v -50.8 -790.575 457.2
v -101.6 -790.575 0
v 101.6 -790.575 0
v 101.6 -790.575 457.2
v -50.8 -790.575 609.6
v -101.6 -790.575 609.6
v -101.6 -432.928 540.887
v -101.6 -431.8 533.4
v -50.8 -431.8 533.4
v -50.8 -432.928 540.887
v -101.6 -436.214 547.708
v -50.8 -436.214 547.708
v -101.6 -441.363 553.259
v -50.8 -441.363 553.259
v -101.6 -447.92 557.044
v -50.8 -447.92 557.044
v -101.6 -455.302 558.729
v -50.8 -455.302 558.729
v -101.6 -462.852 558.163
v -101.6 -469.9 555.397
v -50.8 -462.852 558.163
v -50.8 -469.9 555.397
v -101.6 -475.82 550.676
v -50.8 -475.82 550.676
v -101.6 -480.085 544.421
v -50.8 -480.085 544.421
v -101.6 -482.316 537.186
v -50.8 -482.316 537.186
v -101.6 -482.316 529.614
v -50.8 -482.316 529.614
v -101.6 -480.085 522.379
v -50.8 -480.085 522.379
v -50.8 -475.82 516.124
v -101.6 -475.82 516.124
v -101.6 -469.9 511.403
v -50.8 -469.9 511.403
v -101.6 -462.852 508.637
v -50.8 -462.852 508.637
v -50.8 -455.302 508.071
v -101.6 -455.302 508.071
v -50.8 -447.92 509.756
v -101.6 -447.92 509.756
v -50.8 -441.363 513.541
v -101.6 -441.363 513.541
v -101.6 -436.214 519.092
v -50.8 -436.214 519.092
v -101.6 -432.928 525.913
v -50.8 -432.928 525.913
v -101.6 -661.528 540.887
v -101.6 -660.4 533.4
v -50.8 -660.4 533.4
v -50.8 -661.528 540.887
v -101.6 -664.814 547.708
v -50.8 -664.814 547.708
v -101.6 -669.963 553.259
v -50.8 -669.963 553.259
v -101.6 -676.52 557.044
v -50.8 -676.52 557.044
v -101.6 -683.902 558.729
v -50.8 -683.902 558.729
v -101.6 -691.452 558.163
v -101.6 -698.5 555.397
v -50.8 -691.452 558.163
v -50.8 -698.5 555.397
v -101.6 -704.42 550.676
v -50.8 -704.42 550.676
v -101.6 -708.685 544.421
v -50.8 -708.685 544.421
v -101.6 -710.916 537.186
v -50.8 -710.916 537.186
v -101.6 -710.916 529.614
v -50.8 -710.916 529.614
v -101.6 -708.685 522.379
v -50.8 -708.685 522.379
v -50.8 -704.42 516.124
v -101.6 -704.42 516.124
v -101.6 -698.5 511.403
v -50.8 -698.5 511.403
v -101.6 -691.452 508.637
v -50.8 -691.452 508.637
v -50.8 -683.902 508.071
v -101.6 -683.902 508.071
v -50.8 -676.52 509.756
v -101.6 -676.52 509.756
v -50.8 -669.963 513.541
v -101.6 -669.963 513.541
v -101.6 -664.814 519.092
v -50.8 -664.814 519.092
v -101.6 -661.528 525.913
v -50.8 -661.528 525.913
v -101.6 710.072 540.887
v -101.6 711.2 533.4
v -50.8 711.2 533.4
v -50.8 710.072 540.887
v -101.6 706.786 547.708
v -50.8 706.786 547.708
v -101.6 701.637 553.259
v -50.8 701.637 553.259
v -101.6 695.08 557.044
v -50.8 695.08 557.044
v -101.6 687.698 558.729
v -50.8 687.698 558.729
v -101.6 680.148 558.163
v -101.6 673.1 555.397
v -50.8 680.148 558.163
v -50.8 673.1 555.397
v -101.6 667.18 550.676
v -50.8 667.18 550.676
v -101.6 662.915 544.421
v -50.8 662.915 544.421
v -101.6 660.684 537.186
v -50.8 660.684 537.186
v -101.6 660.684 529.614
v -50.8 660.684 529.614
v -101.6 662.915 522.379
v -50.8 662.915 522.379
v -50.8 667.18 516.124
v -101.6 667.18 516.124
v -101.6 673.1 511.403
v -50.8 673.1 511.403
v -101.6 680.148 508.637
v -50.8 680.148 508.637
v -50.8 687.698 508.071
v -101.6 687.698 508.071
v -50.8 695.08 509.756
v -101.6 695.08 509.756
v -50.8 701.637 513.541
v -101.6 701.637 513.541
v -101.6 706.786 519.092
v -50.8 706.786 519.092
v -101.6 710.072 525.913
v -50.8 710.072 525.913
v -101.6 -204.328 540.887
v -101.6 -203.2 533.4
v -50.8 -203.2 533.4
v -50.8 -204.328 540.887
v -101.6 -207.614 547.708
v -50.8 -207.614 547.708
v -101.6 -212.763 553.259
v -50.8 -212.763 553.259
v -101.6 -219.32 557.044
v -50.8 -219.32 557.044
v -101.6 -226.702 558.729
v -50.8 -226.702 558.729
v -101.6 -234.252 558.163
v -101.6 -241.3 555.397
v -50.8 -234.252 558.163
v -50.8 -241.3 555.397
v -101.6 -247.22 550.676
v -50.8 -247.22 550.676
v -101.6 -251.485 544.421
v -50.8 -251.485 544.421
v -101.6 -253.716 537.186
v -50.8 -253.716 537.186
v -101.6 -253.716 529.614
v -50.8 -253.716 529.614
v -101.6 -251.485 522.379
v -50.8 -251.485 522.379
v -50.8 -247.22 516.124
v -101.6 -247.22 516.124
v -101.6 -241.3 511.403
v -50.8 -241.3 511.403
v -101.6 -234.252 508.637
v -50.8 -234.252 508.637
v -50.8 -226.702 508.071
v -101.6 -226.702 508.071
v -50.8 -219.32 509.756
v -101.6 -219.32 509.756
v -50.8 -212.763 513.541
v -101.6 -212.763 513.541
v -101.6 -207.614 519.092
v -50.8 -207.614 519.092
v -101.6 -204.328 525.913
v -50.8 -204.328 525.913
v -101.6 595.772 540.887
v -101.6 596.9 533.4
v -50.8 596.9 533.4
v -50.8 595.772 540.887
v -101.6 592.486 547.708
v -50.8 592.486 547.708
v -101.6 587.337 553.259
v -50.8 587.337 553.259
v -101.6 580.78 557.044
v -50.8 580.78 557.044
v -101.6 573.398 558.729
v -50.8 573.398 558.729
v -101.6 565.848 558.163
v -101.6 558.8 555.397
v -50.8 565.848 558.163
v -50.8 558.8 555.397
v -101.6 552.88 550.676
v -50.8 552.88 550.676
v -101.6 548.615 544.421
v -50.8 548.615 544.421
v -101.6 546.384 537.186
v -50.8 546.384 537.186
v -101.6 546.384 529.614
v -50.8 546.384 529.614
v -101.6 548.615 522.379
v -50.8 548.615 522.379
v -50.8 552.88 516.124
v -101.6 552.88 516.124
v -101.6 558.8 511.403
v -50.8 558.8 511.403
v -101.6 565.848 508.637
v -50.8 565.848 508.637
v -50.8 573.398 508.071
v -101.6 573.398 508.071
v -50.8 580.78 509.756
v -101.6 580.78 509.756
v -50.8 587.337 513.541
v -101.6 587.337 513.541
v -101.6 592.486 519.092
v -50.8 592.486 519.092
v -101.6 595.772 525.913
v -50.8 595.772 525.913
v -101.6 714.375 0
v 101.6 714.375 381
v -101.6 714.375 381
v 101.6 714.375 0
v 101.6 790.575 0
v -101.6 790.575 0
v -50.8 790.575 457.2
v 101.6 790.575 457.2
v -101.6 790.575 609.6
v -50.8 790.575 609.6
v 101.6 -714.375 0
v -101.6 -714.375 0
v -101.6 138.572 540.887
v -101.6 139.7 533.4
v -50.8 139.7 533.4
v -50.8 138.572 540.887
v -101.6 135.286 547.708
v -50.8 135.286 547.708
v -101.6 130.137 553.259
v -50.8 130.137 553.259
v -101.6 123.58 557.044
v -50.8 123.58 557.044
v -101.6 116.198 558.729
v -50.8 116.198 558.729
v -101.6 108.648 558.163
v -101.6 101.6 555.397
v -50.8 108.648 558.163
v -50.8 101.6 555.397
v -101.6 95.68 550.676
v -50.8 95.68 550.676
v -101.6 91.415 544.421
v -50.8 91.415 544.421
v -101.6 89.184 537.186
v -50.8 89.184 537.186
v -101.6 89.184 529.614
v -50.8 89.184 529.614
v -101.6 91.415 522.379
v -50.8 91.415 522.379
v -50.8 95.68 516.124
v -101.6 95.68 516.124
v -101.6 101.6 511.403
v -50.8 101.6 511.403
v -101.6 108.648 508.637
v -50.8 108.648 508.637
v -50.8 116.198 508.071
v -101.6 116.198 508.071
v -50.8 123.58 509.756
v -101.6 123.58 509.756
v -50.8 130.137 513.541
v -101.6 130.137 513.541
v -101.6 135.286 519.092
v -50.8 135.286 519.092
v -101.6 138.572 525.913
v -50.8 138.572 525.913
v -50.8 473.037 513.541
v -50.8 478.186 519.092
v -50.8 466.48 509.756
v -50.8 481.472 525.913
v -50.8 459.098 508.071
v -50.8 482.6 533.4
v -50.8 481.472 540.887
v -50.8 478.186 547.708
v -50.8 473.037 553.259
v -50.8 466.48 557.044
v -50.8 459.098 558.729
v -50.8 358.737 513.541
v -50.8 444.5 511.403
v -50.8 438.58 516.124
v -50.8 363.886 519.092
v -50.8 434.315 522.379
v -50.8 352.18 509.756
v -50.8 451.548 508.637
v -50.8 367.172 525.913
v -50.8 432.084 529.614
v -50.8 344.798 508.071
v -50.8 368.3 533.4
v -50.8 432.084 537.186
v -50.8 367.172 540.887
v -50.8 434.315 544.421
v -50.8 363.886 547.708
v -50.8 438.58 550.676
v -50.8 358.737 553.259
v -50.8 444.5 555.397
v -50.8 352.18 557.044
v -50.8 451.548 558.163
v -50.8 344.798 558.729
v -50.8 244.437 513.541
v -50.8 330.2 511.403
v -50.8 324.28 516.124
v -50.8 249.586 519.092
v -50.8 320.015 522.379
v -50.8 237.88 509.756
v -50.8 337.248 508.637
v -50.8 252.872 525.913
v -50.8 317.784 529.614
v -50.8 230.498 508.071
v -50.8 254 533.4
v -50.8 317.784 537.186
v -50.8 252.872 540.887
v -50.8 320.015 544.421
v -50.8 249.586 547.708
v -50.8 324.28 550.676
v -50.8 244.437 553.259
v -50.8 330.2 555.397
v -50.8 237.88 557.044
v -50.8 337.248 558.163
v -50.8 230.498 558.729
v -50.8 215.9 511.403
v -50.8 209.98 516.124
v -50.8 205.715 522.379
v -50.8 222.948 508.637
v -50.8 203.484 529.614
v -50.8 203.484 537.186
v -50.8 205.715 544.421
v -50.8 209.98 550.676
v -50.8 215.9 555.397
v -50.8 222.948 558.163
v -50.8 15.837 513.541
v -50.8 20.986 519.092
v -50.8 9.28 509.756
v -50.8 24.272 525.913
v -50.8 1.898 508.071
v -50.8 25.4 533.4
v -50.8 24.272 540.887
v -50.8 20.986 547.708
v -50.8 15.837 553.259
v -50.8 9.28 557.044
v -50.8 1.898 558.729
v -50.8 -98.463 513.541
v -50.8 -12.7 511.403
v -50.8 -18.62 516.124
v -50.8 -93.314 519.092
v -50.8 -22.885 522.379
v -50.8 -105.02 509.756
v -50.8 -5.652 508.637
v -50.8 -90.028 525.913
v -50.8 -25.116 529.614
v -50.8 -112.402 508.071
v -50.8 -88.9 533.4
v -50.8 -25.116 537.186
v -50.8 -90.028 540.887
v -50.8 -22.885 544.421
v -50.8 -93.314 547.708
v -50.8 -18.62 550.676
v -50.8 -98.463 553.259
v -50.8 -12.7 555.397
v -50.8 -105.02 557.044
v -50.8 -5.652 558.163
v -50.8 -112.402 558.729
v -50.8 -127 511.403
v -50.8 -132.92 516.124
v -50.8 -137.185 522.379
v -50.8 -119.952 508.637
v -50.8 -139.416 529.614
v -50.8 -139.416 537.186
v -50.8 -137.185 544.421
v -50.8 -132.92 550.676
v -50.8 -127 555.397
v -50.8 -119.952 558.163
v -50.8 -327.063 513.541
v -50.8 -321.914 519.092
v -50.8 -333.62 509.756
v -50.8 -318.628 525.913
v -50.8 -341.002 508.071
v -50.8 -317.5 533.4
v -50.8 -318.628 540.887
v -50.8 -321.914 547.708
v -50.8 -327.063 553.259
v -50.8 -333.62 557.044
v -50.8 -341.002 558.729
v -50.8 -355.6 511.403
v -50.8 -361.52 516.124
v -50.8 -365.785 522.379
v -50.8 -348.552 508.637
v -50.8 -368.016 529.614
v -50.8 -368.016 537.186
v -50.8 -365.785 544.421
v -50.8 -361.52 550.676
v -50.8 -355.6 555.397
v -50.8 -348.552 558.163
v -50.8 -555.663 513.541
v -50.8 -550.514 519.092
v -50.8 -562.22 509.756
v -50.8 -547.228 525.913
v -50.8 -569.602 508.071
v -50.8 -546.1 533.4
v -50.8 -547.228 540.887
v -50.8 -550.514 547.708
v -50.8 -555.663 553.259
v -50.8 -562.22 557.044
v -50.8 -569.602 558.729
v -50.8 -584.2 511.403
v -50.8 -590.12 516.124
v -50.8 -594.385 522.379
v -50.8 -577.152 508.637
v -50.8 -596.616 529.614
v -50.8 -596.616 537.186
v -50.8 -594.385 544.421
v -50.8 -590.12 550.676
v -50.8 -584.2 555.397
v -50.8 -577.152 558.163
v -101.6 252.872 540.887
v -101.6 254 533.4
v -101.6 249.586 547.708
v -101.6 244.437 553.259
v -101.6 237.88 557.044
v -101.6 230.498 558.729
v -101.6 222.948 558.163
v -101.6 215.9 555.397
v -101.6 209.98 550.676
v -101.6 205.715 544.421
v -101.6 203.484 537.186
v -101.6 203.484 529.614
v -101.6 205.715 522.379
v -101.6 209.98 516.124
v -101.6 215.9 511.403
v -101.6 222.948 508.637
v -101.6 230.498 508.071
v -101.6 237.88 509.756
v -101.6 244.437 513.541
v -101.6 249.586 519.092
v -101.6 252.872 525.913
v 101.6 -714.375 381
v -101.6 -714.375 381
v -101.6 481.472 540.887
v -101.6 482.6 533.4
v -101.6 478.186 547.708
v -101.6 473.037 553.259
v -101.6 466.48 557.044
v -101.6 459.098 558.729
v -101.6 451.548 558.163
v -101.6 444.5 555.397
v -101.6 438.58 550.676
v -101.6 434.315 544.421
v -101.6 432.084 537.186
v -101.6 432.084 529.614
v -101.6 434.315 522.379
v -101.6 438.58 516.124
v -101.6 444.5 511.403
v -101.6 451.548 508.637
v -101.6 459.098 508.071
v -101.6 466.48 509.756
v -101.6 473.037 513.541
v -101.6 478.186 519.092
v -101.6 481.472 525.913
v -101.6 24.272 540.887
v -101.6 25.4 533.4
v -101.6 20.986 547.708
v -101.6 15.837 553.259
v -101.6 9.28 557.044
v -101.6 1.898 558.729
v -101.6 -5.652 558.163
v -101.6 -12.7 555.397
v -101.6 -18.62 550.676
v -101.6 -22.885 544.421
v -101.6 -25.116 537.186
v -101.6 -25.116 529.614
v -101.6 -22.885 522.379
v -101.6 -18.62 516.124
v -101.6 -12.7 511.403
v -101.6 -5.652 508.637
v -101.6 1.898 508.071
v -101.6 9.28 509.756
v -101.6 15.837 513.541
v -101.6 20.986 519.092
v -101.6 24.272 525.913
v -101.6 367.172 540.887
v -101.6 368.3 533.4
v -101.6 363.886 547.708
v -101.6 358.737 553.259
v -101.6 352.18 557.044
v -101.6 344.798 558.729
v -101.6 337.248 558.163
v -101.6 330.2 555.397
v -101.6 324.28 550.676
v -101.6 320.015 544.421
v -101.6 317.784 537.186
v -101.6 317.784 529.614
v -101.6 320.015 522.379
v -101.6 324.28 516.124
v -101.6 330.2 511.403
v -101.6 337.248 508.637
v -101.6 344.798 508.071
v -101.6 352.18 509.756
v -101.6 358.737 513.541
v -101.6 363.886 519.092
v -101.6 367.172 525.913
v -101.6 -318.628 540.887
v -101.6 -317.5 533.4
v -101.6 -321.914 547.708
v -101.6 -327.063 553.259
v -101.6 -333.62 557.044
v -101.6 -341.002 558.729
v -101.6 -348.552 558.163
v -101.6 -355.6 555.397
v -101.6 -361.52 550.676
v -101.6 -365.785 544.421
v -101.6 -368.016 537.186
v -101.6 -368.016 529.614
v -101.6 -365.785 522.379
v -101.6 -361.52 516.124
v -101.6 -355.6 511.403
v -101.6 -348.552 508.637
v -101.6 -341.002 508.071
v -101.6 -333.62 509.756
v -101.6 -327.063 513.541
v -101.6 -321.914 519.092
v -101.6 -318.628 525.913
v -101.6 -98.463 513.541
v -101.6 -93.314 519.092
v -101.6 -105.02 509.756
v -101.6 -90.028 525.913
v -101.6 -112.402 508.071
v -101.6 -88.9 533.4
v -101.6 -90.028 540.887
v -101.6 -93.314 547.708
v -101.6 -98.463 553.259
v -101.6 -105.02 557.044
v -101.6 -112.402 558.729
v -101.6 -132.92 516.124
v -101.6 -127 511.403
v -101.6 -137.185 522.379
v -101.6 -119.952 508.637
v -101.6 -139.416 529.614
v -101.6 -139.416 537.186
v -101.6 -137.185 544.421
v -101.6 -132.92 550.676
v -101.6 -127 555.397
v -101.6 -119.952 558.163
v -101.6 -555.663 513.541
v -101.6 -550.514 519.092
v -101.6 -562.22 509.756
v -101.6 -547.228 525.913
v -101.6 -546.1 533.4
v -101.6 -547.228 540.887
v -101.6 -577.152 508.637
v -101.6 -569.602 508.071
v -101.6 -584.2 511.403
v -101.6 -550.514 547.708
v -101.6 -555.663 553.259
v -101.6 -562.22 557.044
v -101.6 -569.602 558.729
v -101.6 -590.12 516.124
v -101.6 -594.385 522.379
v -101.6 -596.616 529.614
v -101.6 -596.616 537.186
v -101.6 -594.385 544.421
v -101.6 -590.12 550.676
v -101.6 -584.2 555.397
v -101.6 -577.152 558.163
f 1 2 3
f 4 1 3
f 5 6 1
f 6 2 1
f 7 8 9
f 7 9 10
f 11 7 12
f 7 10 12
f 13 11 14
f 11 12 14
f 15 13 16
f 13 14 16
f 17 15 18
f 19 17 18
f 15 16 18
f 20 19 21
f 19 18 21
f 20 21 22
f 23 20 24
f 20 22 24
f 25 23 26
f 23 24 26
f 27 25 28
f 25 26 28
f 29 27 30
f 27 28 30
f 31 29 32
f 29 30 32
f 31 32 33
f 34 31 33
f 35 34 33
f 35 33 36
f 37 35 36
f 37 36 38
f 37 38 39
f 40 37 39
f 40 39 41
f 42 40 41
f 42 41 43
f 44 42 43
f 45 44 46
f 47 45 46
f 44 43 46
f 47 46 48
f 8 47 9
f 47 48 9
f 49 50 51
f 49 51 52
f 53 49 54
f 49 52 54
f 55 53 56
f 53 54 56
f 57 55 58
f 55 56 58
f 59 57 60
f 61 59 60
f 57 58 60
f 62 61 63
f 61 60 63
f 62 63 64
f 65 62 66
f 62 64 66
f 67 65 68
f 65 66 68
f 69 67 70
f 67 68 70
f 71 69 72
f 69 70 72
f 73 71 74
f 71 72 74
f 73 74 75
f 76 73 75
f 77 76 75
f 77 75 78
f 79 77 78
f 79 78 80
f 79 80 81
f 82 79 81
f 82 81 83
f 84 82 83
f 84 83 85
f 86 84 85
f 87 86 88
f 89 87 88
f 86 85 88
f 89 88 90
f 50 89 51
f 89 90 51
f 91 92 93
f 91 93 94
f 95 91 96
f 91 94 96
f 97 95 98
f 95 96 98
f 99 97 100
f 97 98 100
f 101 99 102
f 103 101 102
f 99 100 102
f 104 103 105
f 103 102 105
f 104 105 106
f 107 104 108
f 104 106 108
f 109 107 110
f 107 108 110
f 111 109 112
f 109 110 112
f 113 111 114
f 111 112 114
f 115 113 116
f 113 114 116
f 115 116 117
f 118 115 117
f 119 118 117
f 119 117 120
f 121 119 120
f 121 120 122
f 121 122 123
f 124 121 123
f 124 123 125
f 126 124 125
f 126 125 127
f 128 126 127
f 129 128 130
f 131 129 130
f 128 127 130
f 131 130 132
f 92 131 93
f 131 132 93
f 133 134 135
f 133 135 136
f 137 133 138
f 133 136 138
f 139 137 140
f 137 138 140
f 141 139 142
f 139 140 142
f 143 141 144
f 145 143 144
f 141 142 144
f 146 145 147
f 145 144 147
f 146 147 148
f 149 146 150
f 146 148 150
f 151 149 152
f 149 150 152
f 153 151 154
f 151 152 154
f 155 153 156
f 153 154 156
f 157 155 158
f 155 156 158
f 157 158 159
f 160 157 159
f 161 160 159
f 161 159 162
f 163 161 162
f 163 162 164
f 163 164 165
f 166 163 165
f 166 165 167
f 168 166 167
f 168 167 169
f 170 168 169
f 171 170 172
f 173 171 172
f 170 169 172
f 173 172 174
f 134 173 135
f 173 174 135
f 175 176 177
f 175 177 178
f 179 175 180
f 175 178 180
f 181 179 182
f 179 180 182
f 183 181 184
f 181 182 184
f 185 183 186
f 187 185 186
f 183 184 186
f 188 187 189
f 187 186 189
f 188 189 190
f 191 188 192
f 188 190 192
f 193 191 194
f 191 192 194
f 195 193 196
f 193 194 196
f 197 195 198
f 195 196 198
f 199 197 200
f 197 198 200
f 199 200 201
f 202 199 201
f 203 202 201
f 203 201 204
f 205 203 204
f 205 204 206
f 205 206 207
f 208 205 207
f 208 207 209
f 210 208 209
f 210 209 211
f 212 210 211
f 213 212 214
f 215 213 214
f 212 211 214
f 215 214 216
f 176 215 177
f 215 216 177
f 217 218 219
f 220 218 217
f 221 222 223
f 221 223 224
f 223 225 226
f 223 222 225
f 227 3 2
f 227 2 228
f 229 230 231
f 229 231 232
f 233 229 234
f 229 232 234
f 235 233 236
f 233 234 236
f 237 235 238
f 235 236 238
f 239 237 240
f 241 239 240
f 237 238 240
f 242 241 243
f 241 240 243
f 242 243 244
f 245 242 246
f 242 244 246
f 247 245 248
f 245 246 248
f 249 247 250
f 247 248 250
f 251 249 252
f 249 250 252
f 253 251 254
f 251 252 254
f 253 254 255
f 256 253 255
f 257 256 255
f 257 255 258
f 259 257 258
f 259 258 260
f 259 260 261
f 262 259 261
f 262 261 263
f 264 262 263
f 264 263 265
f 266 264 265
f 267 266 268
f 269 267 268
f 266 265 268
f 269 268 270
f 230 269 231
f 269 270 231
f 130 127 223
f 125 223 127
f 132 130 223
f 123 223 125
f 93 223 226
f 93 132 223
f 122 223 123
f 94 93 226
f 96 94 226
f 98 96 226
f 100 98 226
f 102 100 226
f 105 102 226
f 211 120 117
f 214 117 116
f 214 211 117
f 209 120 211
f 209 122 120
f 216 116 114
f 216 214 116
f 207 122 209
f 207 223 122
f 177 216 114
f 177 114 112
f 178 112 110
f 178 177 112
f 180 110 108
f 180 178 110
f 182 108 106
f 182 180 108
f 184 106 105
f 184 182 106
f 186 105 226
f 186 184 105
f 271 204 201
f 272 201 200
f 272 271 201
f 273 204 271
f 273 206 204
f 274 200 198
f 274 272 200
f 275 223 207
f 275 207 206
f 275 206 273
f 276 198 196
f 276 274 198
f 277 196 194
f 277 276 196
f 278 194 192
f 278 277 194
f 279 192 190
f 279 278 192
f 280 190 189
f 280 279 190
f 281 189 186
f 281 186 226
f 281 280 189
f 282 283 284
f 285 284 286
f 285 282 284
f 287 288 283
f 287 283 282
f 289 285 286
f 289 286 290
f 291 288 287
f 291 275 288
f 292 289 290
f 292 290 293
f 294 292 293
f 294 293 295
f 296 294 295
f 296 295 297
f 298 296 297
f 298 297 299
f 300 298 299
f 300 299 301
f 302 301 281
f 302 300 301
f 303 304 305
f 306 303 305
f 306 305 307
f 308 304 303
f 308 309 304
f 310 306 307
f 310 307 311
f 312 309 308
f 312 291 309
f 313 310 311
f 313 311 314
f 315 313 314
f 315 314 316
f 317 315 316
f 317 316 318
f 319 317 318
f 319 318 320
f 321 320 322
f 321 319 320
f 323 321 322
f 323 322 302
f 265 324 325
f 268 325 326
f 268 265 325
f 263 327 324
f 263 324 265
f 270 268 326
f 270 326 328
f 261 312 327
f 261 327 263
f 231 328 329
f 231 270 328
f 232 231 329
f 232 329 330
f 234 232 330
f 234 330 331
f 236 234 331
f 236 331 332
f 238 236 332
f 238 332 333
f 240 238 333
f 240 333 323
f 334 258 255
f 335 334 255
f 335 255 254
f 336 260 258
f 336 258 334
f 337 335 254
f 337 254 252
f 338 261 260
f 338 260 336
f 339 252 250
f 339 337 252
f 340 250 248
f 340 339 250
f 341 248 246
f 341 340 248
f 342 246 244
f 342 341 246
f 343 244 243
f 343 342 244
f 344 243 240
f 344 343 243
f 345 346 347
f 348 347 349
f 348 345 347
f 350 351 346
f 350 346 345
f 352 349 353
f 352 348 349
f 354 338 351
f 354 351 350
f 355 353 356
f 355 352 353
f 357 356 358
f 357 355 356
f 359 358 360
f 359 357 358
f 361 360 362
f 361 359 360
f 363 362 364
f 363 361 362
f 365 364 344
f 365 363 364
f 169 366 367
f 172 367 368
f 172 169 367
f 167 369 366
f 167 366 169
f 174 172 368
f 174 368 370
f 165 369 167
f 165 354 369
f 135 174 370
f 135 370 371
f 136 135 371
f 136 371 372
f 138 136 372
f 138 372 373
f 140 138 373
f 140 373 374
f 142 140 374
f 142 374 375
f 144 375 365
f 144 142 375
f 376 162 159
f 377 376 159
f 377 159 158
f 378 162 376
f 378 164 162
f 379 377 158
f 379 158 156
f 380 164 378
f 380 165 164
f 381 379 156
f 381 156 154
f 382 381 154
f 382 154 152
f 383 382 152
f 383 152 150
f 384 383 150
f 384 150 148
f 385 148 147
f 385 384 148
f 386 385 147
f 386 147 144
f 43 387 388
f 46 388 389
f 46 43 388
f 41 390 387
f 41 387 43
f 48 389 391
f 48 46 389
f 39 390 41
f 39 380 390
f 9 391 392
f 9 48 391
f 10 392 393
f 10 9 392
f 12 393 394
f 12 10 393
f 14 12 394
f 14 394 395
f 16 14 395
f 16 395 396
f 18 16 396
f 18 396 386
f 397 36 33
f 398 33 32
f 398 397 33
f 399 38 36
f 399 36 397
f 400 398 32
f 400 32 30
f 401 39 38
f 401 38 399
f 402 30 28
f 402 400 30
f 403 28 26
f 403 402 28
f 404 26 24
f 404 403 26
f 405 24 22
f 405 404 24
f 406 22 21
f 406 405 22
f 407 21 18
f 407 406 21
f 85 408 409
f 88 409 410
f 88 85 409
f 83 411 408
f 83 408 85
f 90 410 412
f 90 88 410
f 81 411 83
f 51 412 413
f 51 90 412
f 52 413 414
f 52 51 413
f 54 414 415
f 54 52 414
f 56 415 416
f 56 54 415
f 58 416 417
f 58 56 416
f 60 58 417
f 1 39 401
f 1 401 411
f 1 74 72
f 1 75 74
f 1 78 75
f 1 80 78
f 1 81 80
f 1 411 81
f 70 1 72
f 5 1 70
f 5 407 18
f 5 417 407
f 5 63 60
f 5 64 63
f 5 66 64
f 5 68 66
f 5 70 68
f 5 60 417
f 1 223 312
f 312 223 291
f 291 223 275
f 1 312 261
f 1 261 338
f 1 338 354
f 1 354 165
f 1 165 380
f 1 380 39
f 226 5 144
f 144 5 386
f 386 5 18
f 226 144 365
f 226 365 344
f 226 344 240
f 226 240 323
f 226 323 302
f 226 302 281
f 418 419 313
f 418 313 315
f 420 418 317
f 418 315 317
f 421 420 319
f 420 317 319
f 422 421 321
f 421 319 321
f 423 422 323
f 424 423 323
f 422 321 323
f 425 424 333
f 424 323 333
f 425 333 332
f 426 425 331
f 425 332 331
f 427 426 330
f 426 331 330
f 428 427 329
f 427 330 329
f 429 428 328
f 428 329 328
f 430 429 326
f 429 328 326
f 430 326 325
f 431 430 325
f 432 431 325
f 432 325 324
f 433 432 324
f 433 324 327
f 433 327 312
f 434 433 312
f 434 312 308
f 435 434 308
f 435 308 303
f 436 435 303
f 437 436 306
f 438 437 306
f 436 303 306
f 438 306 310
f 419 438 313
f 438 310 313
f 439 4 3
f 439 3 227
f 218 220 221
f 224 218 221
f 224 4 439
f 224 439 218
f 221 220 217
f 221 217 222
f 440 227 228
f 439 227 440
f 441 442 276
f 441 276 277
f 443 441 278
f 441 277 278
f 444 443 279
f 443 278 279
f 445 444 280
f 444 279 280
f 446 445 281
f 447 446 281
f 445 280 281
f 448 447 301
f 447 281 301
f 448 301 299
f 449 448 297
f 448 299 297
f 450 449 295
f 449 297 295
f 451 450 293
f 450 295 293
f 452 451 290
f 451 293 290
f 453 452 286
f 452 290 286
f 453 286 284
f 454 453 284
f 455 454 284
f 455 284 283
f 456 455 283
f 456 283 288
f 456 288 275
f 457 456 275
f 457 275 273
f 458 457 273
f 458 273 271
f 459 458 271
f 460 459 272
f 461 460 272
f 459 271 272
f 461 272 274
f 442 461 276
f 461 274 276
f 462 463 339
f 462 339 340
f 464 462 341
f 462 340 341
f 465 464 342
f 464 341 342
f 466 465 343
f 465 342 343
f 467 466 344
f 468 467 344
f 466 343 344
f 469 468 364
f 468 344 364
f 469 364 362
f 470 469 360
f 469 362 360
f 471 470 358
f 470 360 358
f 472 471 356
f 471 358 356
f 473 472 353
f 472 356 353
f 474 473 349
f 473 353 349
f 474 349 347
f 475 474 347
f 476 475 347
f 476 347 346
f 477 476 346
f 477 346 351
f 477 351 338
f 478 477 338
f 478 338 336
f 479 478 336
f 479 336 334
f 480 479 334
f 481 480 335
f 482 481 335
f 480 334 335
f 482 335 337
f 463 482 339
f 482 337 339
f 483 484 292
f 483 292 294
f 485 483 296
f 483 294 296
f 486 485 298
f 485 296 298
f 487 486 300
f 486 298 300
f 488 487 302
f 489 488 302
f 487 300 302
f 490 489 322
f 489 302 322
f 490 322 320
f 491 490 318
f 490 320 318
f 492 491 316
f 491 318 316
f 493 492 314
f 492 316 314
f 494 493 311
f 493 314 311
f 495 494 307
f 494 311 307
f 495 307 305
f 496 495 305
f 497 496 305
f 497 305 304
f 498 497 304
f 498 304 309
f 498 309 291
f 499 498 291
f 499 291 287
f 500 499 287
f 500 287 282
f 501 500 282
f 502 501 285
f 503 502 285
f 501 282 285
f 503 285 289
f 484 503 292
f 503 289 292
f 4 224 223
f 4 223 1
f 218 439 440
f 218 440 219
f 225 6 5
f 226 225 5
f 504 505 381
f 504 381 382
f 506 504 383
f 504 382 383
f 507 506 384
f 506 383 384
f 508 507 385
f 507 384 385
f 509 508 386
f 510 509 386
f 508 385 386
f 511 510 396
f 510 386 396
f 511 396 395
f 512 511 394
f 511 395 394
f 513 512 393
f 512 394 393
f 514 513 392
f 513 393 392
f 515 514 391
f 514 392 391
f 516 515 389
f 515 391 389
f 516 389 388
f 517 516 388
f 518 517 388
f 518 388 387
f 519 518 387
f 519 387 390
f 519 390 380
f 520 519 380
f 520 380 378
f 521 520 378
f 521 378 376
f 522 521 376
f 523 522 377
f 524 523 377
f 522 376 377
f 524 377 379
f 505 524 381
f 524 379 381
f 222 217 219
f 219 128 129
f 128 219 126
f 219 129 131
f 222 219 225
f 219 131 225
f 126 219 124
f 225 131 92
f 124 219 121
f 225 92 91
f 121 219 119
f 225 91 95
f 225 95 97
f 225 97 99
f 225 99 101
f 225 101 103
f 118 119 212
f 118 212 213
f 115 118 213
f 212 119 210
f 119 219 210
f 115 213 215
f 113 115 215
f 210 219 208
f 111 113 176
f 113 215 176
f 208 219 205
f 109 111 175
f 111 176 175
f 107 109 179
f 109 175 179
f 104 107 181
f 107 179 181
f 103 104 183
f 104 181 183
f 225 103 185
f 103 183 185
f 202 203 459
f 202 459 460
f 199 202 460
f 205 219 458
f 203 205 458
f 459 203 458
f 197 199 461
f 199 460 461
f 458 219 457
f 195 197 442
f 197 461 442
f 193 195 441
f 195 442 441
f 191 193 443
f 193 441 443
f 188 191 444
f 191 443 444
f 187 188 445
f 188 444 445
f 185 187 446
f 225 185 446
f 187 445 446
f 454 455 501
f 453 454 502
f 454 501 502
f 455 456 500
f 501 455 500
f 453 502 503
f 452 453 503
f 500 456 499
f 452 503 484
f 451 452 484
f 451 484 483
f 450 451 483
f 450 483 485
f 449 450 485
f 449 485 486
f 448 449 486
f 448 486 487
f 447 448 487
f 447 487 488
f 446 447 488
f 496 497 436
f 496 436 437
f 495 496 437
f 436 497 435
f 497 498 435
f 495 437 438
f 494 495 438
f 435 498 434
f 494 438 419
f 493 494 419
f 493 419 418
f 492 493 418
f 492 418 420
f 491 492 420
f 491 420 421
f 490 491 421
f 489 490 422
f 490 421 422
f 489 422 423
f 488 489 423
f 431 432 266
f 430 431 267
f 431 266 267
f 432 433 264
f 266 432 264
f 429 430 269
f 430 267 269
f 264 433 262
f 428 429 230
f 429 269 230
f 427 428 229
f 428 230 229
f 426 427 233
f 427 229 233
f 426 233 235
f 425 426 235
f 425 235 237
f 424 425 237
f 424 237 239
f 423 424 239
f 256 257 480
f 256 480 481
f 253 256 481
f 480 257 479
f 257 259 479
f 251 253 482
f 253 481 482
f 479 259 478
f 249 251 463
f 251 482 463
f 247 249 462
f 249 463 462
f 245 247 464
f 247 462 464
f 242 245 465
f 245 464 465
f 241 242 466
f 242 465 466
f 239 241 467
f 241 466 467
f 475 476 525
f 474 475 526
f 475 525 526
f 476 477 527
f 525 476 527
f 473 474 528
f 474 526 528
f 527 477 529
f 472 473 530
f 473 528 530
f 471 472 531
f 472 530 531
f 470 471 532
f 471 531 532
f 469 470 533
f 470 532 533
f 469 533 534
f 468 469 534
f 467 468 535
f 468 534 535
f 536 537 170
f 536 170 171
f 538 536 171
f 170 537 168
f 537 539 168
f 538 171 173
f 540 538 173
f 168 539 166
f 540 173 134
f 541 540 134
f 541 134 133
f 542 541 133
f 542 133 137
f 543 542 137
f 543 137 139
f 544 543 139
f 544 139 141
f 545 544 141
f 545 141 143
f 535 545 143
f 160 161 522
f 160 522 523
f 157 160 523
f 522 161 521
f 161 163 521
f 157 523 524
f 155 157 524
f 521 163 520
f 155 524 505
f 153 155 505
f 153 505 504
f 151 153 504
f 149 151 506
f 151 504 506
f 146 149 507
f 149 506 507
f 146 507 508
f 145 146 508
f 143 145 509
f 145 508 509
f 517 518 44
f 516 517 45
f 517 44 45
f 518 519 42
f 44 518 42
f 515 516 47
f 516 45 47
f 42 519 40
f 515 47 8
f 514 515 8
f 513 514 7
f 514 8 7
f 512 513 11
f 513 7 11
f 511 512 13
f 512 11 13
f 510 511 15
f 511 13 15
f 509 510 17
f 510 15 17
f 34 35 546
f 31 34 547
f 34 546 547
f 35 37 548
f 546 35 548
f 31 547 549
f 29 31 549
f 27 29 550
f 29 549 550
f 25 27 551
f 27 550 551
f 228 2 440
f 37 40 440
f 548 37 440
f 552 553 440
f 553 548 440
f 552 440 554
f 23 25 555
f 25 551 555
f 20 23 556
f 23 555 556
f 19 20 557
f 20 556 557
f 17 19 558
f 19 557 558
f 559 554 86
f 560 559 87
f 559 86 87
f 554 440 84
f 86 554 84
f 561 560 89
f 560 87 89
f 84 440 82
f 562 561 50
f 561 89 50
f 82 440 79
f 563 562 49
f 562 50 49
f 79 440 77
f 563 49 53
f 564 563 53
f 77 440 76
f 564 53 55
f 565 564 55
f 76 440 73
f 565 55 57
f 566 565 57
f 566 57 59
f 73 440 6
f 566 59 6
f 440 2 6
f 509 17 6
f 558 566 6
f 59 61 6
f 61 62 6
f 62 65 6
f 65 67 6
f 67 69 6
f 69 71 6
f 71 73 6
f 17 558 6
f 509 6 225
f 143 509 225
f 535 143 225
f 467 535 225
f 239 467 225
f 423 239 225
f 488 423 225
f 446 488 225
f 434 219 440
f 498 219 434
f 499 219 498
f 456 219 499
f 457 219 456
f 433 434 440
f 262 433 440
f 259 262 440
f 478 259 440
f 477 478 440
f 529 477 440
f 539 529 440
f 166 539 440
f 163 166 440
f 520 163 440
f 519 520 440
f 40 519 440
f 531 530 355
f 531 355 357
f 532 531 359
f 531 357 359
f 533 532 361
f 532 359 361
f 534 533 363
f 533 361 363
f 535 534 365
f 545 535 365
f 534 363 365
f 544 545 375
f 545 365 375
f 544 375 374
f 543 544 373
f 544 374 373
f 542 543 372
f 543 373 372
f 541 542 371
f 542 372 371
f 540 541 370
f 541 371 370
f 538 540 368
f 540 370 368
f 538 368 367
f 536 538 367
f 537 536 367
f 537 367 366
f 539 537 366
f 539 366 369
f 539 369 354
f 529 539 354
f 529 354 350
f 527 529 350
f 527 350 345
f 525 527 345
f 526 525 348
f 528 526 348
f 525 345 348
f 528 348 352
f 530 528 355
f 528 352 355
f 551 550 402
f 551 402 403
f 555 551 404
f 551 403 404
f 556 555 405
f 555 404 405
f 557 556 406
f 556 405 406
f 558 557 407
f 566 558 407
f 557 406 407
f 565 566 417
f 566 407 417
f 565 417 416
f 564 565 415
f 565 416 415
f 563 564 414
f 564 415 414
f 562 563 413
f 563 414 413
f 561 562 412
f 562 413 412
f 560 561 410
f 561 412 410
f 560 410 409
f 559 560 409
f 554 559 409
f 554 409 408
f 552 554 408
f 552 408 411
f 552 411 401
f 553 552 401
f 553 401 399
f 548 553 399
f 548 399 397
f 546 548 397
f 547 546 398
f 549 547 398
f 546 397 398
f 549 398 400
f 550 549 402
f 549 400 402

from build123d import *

# Parameters (mm, degrees)
F1_DEPTH = 101.6
F2_W     = 50.8
F2_H     = 152.4
F3_DEPTH = 1581.15
F4_R     = 25.4
F5_DEPTH = 50.8


with BuildPart() as f1:
    # F0 (on Right) → F1 (new body, symmetric)
    with BuildSketch(Plane.YZ):
        Polygon((-790.575, 457.2), (-790.575, 0), (-714.375, 0), (-714.375, 381), (714.375, 381), (714.375, 0), (790.575, 0), (790.575, 457.2), align=None)
    extrude(amount=F1_DEPTH, both=True)

    # F2 (on face) → F3 (join, through all)
    with BuildSketch(Plane.XZ.offset(790.575)):
        with Locations((-76.2, 533.4)):
            Rectangle(F2_W, F2_H)
    extrude(amount=-F3_DEPTH)

    # F4 (on face) → F5 (cut, through all)
    with BuildSketch(Plane.YZ.offset(-50.8)):
        with Locations((-457.2, 533.4)):
            Circle(F4_R)
        with Locations((-342.9, 533.4)):
            Circle(F4_R)
        with Locations((-228.6, 533.4)):
            Circle(F4_R)
        with Locations((-114.3, 533.4)):
            Circle(F4_R)
        with Locations((0, 533.4)):
            Circle(F4_R)
        with Locations((-685.8, 533.4)):
            Circle(F4_R)
        with Locations((-571.5, 533.4)):
            Circle(F4_R)
        with Locations((114.3, 533.4)):
            Circle(F4_R)
        with Locations((228.6, 533.4)):
            Circle(F4_R)
        with Locations((342.9, 533.4)):
            Circle(F4_R)
        with Locations((457.2, 533.4)):
            Circle(F4_R)
        with Locations((571.5, 533.4)):
            Circle(F4_R)
        with Locations((685.8, 533.4)):
            Circle(F4_R)
    extrude(amount=-F5_DEPTH, mode=Mode.SUBTRACT)


solid = f1.part
